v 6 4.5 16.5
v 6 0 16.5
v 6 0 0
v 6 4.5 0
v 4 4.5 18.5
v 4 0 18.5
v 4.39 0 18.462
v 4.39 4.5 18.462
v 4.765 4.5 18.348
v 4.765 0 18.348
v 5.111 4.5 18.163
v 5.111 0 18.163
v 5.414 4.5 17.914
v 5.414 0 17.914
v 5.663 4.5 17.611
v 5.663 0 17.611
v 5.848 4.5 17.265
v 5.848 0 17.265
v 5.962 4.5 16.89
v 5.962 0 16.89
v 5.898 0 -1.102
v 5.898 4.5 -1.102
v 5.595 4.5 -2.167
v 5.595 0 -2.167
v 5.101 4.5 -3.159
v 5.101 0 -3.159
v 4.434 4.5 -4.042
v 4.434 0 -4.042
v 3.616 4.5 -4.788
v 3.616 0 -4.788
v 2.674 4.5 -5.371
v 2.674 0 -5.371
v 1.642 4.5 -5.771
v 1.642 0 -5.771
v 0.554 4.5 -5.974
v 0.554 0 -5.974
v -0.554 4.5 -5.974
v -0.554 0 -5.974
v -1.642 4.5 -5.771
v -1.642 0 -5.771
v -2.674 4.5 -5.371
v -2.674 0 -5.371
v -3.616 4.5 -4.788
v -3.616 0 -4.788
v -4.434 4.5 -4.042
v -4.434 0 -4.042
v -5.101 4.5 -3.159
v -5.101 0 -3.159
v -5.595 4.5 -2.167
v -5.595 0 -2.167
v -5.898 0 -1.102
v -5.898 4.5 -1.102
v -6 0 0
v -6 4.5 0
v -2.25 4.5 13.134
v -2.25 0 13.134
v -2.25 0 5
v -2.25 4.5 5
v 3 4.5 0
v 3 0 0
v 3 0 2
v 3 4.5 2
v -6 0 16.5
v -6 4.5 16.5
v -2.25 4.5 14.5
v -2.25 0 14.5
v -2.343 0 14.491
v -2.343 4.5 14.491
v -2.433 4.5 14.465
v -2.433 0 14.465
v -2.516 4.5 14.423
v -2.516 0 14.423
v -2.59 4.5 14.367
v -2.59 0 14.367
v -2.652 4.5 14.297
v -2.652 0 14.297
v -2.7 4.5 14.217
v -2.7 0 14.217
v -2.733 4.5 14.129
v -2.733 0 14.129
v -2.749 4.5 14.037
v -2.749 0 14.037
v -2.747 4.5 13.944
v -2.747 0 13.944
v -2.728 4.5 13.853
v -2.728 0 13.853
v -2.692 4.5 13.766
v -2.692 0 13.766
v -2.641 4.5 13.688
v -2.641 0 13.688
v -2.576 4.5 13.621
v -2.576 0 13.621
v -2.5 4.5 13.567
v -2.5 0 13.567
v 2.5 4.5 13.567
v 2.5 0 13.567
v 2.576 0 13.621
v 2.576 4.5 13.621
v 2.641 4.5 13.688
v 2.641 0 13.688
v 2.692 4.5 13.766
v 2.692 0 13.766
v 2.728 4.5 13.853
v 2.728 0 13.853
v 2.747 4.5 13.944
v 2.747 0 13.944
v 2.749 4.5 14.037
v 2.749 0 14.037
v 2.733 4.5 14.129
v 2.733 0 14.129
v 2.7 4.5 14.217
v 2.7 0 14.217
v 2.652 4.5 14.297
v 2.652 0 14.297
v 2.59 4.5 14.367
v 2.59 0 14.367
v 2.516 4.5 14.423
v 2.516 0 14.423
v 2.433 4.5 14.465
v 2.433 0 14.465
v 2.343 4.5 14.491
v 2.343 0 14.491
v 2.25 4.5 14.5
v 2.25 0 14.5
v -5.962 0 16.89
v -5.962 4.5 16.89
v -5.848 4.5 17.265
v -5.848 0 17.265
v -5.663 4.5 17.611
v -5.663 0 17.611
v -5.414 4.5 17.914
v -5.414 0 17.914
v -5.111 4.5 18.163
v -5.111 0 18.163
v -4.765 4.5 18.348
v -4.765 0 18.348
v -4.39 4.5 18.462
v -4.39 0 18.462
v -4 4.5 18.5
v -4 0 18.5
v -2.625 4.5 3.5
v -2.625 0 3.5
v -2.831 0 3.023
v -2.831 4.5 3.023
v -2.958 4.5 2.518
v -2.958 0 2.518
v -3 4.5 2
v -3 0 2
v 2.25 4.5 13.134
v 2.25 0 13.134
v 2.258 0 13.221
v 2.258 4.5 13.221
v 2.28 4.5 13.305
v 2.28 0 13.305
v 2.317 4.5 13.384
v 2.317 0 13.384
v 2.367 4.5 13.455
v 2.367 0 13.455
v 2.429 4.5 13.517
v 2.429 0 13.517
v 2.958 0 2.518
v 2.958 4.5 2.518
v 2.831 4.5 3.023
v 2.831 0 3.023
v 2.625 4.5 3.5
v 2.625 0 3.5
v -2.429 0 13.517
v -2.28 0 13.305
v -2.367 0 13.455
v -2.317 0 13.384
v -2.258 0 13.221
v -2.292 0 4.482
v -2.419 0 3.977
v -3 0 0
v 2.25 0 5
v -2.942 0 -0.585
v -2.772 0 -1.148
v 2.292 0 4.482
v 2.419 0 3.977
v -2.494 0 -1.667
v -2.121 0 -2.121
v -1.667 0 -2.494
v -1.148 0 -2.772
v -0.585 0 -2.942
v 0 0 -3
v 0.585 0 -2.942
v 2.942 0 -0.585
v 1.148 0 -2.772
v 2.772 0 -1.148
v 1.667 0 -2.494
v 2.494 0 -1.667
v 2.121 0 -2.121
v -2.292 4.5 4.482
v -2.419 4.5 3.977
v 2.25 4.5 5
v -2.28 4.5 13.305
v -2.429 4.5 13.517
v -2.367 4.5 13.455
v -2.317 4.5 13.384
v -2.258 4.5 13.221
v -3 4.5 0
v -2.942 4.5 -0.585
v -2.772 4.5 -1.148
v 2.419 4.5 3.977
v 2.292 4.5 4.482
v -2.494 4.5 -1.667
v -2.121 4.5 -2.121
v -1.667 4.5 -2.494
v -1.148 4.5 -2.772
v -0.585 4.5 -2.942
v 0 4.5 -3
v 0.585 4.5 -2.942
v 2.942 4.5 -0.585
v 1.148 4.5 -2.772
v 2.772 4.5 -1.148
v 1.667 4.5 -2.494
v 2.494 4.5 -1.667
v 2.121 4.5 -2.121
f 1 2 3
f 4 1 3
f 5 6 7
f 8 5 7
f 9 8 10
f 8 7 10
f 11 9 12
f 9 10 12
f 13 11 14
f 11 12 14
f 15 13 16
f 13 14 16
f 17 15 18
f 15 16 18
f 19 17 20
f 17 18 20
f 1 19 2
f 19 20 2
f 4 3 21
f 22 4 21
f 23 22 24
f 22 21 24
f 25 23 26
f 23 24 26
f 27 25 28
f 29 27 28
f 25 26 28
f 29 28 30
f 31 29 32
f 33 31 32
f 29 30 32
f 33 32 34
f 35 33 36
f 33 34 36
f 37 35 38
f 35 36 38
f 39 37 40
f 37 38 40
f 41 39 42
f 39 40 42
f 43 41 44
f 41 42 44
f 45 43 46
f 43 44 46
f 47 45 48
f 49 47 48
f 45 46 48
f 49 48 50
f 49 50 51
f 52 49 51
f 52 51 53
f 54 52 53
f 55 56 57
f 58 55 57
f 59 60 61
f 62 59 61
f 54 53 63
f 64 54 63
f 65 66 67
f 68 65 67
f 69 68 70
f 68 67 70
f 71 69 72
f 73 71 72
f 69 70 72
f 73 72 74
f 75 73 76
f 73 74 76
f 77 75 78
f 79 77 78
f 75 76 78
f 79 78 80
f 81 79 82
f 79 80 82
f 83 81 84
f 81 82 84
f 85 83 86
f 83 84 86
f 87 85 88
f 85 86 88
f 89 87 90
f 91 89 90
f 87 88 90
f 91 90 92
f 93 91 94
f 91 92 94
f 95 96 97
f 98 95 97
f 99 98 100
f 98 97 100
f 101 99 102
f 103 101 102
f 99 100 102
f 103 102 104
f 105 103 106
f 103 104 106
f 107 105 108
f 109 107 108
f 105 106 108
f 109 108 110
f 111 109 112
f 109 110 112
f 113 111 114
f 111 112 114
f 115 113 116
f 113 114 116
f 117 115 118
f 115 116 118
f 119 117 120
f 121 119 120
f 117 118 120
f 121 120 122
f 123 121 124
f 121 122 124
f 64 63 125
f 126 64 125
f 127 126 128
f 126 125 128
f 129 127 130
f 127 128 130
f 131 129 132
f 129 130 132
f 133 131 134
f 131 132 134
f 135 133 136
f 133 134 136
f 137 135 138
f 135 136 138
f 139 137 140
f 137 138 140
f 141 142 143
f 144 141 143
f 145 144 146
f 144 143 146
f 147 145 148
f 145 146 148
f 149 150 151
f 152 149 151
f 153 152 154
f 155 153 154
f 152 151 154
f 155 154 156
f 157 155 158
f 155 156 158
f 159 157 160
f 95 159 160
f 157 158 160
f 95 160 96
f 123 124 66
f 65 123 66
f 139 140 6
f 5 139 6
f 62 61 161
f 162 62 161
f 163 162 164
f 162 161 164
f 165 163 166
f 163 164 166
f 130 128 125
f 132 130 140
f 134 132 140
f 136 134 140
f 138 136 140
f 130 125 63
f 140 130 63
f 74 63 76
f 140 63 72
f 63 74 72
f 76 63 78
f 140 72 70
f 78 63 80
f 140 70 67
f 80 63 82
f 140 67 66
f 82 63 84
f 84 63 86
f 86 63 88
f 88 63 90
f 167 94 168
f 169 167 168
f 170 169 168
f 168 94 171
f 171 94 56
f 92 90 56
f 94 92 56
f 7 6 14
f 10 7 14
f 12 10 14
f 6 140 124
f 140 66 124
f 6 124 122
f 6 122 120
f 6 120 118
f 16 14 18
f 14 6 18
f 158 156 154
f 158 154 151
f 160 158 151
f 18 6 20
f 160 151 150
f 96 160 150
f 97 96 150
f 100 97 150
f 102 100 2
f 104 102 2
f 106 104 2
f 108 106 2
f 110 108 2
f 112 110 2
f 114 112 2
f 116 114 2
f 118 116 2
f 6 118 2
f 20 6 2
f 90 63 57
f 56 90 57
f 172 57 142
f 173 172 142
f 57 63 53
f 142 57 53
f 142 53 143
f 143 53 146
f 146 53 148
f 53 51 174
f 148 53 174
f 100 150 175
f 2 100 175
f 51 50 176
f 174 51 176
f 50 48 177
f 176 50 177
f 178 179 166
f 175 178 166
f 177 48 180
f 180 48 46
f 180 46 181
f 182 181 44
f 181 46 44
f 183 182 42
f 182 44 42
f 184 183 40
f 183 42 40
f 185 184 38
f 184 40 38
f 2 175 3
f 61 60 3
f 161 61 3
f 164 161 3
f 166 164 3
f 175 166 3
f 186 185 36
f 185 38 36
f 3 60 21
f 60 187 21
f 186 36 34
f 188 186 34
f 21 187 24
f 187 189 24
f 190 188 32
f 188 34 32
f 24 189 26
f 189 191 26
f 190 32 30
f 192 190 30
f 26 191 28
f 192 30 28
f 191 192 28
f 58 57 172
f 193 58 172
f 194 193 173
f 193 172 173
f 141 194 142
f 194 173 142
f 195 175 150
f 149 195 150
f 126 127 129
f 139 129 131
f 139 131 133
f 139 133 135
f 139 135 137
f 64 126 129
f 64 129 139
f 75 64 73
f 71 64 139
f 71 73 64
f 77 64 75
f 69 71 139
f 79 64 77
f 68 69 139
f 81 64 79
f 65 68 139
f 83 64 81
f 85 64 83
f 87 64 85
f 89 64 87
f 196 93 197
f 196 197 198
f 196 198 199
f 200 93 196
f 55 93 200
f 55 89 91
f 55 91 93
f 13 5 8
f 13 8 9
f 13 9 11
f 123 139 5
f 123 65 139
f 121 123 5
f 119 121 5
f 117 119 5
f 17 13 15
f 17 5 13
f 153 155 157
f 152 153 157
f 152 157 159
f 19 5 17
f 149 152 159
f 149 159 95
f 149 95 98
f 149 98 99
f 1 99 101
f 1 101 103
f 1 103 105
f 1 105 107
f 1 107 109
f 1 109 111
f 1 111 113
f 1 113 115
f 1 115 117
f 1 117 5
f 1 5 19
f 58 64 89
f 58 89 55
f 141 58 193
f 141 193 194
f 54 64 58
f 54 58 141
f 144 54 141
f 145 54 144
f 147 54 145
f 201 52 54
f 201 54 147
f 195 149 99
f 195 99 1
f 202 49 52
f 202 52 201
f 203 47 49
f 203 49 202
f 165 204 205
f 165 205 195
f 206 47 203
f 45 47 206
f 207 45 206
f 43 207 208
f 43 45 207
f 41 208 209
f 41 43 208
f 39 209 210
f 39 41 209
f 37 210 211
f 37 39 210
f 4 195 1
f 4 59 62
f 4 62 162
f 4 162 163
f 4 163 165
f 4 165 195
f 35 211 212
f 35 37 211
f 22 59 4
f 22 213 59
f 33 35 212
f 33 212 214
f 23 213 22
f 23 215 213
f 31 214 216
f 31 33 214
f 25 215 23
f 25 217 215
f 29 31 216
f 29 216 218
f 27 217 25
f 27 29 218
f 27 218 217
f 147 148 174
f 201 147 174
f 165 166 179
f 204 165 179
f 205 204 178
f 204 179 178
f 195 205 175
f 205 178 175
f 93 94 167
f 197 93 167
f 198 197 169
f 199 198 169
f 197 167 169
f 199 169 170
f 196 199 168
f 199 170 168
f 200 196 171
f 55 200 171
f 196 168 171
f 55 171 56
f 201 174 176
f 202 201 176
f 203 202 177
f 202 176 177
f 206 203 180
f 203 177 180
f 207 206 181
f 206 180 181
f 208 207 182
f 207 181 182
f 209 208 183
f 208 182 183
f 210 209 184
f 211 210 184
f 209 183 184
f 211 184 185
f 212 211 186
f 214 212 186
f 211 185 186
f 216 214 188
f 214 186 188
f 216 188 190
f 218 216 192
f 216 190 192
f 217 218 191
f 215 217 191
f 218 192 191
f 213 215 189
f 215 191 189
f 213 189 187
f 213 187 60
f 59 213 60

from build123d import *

# Parameters (mm, degrees)
BOSS_EXTRUDE1_DEPTH = 4.5


with BuildPart() as part:
    # Sketch1 → Boss-Extrude1 (new body)
    with BuildSketch(Plane(origin=(0, 0, 0), x_dir=(1, 0, 0), z_dir=(0, 1, 0))):
        with BuildLine():
            Line((-6, 0), (-6, -5))
            Line((-6, -5), (-6, -16.5))
            ThreePointArc((-6, -16.5), (-5.414213562, -17.914213562), (-4, -18.5))
            Line((-4, -18.5), (4, -18.5))
            ThreePointArc((4, -18.5), (5.414213562, -17.914213562), (6, -16.5))
            Line((6, -16.5), (6, -5))
            Line((6, -5), (6, 0))
            ThreePointArc((6, 0), (0, 6), (-6, 0))
        make_face()
        with BuildLine():
            Line((3, 0), (3, -2))
            ThreePointArc((3, -2), (2.904829219, -2.773082305), (2.625, -3.5))
            ThreePointArc((2.625, -3.5), (2.345170781, -4.226917695), (2.25, -5))
            Line((2.25, -5), (2.25, -13.133974596))
            ThreePointArc((2.25, -13.133974596), (2.316987298, -13.383974596), (2.5, -13.566987298))
            ThreePointArc((2.5, -13.566987298), (2.732962913, -14.129409523), (2.25, -14.5))
            Line((2.25, -14.5), (-2.25, -14.5))
            ThreePointArc((-2.25, -14.5), (-2.732962913, -14.129409523), (-2.5, -13.566987298))
            ThreePointArc((-2.5, -13.566987298), (-2.316987298, -13.383974596), (-2.25, -13.133974596))
            Line((-2.25, -13.133974596), (-2.25, -5))
            ThreePointArc((-2.25, -5), (-2.345170781, -4.226917695), (-2.625, -3.5))
            ThreePointArc((-2.625, -3.5), (-2.904829219, -2.773082305), (-3, -2))
            Line((-3, -2), (-3, 0))
            ThreePointArc((-3, 0), (0, 3), (3, 0))
        make_face(mode=Mode.SUBTRACT)
    extrude(amount=BOSS_EXTRUDE1_DEPTH)


solid = part.part
